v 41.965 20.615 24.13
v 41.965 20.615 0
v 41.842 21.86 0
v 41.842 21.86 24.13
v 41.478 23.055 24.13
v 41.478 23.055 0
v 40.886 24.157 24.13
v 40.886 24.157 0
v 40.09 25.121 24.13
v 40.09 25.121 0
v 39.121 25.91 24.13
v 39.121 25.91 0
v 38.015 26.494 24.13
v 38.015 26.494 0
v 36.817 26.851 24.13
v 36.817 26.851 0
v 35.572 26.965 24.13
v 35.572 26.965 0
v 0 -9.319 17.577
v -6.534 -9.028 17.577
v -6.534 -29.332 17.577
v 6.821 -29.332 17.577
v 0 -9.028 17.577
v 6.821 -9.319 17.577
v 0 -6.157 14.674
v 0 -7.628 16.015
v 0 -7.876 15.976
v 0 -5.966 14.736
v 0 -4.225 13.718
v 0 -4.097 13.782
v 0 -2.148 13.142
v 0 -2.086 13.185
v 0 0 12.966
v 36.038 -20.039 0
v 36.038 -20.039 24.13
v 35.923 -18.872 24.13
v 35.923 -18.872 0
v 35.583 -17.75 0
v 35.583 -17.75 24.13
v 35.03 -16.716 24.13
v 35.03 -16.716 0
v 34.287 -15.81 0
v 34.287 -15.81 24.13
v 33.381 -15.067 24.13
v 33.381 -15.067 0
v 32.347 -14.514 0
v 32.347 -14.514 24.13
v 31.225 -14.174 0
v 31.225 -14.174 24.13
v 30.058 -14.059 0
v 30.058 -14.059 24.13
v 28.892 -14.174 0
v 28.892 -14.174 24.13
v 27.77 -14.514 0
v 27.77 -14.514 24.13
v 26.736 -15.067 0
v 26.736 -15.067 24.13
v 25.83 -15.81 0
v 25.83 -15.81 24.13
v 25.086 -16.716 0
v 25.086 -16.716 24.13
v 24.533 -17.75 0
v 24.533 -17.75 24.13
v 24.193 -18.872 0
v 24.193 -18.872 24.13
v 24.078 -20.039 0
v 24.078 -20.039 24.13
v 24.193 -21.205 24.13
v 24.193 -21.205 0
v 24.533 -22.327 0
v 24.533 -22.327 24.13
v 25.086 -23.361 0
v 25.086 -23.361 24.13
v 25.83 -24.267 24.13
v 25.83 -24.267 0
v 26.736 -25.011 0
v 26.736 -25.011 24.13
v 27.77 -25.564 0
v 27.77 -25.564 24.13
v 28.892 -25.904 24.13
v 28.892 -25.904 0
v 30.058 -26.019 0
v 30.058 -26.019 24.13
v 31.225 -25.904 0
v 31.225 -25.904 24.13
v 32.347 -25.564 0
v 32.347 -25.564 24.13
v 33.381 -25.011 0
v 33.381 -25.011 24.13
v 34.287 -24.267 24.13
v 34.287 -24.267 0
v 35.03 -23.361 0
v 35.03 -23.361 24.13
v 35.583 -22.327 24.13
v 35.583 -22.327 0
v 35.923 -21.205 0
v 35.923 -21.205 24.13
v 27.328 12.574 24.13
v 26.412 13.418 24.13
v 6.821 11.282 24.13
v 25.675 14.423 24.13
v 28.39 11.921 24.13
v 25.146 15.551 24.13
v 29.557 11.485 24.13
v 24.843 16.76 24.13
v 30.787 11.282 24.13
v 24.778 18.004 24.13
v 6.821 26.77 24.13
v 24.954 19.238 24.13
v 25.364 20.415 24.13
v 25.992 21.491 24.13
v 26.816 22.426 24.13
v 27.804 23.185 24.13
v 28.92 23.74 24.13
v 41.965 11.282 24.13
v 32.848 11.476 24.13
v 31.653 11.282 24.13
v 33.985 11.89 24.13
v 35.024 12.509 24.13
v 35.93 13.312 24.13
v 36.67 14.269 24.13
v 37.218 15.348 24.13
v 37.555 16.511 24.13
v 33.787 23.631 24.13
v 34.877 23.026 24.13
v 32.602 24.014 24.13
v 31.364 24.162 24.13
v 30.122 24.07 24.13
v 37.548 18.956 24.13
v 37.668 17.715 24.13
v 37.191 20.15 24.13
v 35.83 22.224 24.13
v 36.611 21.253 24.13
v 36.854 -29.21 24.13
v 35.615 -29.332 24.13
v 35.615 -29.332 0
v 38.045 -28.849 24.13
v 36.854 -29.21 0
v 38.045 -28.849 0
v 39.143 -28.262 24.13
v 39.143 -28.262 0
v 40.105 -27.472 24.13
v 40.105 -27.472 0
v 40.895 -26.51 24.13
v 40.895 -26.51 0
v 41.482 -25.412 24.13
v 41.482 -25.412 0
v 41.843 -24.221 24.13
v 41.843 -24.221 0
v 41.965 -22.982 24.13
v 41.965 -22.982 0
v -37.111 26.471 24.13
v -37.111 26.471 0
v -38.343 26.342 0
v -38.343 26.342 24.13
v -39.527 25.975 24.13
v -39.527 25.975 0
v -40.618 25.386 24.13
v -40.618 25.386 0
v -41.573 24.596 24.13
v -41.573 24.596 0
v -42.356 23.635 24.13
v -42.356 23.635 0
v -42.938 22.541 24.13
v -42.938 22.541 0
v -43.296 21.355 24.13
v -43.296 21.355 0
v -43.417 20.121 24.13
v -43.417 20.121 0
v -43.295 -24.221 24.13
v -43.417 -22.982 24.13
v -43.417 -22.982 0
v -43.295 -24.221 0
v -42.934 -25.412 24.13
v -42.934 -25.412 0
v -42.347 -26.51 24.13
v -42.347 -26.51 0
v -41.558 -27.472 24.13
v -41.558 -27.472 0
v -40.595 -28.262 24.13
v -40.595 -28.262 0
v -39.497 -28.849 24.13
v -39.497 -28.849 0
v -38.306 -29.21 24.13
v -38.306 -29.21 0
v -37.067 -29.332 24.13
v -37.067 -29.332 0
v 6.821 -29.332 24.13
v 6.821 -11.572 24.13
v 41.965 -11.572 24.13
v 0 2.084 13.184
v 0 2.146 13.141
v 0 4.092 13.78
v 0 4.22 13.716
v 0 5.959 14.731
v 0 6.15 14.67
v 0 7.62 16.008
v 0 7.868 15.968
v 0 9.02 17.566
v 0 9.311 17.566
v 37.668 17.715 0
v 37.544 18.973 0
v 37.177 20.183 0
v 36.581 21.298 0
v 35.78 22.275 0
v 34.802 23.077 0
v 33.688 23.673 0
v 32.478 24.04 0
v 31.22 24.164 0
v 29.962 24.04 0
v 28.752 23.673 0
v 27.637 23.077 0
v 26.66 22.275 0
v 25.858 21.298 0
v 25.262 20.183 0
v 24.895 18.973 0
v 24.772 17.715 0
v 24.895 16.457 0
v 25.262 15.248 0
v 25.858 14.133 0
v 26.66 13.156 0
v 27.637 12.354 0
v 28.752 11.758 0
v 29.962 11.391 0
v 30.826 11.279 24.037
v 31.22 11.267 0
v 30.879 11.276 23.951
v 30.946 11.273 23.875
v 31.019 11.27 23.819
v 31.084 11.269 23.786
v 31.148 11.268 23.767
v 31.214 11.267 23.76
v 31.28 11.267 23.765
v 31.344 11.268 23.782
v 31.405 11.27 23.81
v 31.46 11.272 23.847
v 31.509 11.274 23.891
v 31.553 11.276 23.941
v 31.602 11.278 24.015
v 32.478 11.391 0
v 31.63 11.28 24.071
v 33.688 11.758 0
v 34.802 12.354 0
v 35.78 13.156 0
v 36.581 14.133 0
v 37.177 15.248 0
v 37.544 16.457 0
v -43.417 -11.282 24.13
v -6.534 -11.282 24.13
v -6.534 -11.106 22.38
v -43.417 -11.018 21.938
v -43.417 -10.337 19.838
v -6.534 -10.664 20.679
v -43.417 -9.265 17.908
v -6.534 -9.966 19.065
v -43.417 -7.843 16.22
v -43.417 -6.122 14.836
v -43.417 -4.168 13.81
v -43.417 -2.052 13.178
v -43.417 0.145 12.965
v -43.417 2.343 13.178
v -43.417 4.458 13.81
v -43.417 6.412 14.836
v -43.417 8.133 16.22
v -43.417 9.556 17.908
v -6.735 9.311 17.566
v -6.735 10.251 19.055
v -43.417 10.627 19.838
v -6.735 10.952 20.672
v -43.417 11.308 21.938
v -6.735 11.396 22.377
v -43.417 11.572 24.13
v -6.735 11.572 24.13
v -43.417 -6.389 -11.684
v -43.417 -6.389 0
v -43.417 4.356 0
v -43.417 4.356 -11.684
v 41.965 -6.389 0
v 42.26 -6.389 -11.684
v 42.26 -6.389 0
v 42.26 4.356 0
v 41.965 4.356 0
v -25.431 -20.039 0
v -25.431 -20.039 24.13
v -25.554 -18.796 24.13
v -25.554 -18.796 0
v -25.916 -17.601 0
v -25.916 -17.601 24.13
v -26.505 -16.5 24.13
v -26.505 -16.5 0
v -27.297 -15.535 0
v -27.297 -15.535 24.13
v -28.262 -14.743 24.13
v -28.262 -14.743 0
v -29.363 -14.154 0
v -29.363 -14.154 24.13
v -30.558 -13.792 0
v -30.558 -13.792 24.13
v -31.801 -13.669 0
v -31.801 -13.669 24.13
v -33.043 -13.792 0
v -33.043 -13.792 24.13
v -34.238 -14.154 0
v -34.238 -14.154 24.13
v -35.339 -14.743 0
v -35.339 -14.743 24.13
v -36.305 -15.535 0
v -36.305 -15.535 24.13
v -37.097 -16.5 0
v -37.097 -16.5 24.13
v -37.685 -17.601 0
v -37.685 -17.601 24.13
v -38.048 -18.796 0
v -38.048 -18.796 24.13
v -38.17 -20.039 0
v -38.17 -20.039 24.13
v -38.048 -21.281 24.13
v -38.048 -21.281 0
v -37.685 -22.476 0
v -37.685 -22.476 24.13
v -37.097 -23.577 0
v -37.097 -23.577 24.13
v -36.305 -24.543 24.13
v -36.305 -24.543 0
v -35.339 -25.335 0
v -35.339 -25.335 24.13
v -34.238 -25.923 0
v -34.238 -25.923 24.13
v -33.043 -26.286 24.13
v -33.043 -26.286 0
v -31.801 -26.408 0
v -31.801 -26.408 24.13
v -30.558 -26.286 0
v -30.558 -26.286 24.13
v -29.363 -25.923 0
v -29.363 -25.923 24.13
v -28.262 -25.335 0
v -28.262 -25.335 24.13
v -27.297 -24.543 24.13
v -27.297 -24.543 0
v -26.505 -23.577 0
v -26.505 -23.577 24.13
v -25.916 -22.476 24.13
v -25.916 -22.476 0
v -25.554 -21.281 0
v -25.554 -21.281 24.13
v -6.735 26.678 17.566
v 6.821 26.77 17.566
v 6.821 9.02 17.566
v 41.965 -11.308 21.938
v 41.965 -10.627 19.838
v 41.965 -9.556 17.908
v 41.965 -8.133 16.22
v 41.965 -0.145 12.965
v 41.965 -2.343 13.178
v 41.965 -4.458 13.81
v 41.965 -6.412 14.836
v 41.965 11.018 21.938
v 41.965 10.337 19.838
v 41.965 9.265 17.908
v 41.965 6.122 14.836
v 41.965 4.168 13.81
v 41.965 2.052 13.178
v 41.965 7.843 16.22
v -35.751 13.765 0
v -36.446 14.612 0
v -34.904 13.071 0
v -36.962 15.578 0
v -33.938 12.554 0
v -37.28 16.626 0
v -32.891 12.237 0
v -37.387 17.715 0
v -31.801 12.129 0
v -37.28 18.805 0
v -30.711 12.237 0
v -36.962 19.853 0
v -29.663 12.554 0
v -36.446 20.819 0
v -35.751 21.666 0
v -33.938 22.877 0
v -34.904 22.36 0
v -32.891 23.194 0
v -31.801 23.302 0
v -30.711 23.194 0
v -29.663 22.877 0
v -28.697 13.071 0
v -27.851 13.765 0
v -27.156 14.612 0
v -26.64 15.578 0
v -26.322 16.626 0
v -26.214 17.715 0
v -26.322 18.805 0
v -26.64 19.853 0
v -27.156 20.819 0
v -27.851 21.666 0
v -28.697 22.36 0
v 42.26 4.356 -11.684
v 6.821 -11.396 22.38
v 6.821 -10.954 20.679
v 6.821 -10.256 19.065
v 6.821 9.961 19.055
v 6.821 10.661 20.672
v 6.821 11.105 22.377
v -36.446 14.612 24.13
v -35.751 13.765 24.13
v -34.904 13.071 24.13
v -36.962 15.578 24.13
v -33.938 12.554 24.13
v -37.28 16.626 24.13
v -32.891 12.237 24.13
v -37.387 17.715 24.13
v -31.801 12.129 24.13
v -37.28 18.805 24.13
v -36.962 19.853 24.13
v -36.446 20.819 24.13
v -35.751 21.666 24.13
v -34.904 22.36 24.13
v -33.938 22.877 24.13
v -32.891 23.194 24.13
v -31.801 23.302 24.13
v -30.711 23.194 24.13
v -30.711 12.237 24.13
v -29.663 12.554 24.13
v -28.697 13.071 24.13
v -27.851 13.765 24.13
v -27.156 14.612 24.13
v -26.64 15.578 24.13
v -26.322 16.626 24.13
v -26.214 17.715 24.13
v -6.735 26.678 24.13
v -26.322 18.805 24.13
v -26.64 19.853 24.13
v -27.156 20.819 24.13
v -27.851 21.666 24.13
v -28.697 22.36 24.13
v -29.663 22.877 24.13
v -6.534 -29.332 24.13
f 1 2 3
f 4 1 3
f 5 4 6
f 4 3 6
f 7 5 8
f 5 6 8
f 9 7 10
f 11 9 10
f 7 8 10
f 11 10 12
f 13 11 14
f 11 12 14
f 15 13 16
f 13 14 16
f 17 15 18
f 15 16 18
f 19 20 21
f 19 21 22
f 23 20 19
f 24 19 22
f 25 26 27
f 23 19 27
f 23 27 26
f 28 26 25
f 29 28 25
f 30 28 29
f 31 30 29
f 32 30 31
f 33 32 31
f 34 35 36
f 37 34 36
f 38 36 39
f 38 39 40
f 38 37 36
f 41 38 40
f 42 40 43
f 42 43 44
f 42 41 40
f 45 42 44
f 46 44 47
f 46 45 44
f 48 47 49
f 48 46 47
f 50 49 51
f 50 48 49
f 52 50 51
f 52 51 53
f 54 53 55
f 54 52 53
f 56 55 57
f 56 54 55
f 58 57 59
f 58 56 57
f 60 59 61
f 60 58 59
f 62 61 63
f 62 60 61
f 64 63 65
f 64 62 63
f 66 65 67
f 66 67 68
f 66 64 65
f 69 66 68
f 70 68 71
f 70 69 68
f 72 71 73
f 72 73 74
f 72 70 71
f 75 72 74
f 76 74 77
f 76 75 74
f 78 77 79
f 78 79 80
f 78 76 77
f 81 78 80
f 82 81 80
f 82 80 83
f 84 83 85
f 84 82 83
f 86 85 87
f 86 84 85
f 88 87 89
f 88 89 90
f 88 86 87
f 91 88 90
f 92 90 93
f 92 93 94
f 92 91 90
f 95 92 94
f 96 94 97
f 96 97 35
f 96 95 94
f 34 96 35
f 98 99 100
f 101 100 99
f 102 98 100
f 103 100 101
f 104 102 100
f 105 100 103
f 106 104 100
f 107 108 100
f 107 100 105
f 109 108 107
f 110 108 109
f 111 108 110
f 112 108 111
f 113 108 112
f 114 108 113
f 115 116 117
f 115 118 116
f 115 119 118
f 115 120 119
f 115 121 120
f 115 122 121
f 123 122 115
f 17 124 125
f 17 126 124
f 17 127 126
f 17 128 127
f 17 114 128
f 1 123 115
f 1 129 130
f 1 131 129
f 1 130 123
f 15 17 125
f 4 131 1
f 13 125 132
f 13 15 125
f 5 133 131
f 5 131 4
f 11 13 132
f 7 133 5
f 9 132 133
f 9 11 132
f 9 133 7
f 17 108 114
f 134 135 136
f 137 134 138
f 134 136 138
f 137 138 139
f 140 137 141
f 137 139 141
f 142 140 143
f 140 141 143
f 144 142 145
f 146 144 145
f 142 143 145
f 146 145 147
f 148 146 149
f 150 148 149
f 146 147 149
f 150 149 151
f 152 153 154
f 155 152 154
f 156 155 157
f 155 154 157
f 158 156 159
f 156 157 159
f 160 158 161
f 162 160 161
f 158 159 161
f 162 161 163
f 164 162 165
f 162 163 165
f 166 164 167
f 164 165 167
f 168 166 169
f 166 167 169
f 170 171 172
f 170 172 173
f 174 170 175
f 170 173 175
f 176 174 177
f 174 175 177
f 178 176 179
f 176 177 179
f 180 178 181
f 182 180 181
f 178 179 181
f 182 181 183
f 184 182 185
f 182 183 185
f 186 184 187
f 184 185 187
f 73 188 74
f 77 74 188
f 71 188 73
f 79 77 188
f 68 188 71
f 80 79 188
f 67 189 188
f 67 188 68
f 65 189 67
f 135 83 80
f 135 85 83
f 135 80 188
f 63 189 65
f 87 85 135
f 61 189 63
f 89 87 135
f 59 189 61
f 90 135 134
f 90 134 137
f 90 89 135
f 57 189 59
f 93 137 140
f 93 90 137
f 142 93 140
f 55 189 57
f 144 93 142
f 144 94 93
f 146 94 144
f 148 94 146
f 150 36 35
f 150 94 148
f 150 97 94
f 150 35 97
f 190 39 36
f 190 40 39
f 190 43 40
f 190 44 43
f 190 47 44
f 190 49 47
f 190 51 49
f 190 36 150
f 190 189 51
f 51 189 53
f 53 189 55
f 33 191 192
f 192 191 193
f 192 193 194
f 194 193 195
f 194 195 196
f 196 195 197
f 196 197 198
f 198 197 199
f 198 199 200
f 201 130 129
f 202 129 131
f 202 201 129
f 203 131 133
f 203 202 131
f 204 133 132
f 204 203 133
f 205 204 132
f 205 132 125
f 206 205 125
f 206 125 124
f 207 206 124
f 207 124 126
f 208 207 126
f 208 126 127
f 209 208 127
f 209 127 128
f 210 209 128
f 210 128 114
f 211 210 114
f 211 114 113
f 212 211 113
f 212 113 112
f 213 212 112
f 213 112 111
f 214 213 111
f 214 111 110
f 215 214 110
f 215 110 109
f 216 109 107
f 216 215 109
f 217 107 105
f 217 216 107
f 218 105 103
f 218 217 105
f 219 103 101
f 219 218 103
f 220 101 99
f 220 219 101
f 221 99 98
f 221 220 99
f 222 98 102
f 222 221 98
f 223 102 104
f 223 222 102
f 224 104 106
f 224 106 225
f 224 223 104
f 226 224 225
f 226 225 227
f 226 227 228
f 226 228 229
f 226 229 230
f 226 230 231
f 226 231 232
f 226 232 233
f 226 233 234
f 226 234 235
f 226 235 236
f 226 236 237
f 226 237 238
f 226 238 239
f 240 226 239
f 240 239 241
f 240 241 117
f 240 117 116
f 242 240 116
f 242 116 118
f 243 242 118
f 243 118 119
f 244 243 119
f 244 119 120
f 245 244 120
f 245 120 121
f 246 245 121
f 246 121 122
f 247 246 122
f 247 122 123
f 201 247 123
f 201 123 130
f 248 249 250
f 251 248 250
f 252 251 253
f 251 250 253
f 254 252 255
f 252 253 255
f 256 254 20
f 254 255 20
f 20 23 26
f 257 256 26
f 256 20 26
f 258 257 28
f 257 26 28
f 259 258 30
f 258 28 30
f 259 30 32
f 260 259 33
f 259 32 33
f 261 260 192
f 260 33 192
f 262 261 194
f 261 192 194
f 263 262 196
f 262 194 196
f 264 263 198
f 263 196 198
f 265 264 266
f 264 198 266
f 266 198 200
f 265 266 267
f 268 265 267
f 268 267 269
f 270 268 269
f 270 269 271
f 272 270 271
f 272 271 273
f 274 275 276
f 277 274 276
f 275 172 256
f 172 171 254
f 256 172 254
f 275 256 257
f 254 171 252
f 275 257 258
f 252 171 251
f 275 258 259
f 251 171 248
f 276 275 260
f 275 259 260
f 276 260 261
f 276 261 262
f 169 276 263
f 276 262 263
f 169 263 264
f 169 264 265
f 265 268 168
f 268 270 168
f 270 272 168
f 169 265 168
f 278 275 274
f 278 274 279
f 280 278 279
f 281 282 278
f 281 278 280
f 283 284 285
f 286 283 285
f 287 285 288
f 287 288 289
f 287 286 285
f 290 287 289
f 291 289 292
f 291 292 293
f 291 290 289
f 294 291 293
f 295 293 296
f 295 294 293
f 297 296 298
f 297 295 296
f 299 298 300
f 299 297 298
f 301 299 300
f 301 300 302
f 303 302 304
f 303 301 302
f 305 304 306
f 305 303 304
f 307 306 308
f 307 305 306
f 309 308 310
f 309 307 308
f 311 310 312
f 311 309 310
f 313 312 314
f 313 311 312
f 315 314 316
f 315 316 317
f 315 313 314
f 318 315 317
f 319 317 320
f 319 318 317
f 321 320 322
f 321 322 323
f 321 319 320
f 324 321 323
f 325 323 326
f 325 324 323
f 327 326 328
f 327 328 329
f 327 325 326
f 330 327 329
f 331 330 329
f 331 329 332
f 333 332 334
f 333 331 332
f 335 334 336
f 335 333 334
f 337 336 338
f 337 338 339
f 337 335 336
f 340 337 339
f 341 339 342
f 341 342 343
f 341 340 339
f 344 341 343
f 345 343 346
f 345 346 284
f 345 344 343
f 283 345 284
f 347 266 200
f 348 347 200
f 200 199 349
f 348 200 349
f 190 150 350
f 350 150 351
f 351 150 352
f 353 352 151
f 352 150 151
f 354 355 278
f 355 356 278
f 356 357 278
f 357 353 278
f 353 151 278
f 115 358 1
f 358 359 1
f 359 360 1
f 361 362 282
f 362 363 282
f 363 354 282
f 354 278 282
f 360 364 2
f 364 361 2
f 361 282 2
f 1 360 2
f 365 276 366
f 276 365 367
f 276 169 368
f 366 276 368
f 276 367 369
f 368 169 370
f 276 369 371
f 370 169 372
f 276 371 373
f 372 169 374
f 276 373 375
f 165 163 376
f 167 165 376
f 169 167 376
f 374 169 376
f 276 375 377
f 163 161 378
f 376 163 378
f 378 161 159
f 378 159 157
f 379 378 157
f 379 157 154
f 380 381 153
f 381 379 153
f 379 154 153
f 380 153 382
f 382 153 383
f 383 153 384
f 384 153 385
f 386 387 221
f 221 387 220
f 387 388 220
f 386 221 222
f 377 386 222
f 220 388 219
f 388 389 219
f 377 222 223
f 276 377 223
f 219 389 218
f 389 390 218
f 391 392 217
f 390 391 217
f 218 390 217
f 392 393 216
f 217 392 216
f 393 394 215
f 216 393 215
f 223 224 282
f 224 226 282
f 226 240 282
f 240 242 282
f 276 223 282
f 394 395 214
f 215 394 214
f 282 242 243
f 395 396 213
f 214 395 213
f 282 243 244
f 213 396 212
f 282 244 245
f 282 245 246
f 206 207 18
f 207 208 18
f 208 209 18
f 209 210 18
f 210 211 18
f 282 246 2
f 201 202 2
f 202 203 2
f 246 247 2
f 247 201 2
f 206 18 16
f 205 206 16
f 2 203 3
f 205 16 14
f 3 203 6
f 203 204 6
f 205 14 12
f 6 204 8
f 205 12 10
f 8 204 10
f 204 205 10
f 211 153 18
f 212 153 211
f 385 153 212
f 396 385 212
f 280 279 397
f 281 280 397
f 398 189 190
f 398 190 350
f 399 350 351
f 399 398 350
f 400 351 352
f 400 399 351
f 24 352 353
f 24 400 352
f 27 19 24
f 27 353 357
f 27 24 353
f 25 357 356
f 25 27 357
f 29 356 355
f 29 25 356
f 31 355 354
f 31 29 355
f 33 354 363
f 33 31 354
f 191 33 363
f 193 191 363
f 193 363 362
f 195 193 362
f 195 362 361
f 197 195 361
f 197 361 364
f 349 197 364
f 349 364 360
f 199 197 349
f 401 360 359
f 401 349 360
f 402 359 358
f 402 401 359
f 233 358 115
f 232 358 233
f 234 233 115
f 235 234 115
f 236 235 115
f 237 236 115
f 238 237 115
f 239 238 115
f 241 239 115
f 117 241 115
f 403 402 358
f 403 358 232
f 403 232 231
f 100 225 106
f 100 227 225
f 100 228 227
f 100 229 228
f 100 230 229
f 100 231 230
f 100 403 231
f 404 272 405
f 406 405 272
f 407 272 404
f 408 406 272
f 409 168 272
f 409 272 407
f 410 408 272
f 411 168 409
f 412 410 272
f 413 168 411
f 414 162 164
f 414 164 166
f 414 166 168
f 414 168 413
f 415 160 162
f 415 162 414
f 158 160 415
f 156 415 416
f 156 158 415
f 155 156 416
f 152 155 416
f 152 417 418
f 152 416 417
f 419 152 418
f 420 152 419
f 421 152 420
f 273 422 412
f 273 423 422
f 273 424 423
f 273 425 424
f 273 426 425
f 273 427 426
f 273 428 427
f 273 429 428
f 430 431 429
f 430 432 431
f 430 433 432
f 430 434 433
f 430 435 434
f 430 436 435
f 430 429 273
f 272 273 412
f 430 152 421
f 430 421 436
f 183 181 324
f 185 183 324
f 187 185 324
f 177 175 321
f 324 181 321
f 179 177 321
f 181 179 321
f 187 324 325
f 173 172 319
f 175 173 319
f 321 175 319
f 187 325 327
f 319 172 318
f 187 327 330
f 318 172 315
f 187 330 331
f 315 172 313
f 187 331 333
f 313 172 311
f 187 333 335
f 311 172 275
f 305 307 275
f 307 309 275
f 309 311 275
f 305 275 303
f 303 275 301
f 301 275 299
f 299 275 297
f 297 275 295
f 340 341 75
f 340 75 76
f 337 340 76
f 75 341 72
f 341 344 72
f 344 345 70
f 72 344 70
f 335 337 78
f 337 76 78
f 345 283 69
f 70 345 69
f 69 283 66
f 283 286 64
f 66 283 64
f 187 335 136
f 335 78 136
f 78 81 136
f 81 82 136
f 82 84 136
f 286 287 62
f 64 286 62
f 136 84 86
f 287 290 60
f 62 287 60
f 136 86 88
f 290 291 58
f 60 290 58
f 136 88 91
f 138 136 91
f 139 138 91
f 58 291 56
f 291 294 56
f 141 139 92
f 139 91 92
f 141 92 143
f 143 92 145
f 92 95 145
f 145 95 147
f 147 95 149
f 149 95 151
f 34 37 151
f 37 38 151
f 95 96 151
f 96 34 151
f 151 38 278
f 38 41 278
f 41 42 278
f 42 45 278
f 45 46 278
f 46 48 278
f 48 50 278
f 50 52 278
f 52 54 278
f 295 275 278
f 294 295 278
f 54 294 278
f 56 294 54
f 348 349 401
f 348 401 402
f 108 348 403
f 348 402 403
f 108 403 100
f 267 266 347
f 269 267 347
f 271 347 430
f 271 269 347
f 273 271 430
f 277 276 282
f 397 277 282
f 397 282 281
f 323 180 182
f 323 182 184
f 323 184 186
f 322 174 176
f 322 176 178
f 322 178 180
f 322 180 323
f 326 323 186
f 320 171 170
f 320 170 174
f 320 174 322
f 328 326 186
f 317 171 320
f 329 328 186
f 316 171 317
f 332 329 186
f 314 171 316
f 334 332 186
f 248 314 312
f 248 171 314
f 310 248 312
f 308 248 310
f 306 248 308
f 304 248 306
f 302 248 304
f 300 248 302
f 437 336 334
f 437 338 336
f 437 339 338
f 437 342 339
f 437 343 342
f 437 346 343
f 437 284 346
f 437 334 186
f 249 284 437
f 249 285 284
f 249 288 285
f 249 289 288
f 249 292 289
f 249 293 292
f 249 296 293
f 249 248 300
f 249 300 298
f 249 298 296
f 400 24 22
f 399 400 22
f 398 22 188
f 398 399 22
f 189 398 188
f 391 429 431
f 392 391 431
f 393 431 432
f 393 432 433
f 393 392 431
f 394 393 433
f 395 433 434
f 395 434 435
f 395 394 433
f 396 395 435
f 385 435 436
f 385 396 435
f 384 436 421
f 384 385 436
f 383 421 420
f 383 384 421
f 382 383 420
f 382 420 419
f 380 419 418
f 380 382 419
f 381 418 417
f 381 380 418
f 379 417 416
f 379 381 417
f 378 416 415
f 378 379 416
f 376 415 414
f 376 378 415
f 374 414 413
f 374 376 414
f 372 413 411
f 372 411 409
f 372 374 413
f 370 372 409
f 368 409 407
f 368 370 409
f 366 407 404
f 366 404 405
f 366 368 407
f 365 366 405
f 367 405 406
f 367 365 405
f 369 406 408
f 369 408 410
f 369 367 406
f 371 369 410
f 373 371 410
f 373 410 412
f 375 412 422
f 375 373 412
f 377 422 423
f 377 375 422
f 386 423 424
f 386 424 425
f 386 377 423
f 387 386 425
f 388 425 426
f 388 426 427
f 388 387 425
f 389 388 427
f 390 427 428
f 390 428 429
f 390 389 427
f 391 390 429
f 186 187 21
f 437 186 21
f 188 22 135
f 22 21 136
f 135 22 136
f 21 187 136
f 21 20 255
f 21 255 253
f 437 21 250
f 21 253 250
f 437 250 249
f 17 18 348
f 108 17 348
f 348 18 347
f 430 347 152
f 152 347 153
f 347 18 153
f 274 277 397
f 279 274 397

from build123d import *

# Parameters (mm, degrees)
F0_R      = 6.369353
F0_R_2    = 5.980064
F0_R_3    = 5.586292
F0_R_4    = 6.448317
F1_DEPTH  = 24.13
F2_W      = 13.556814
F2_H      = 8.429615
F3_DEPTH  = 37.846
F4_W      = 13.355822
F4_H      = 12.236101
F5_DEPTH  = 46.736
F6_R      = 11.43
F7_DEPTH  = 53.594
F8_R      = 11.43
F9_DEPTH  = 57.404
F10_W     = 85.677572
F10_H     = 10.745444
F11_DEPTH = 11.684


with BuildPart() as f1:
    # F0 (on Top) → F1 (new body)
    with BuildSketch(Plane.XY):
        with BuildLine():
            ThreePointArc((-37.110602, 26.470889), (-41.57278, 24.595866), (-43.417405, 20.121036))
            Line((-43.417405, 20.121036), (-43.417405, -22.982161))
            ThreePointArc((-43.417405, -22.982161), (-41.557533, -27.472289), (-37.067405, -29.332161))
            Line((-37.067405, -29.332161), (35.615317, -29.332161))
            ThreePointArc((35.615317, -29.332161), (40.105445, -27.472289), (41.965317, -22.982161))
            Line((41.965317, -22.982161), (41.965317, 20.615476))
            ThreePointArc((41.965317, 20.615476), (40.090147, 25.120851), (35.572121, 26.965329))
            Line((35.572121, 26.965329), (-37.110602, 26.470889))
        make_face()
        with Locations((-31.80071, -20.038802)):
            Circle(F0_R, mode=Mode.SUBTRACT)
        with Locations((30.058201, -20.038802)):
            Circle(F0_R_2, mode=Mode.SUBTRACT)
        with Locations((-31.80071, 17.715463)):
            Circle(F0_R_3, mode=Mode.SUBTRACT)
        with Locations((31.21987, 17.715463)):
            Circle(F0_R_4, mode=Mode.SUBTRACT)
    extrude(amount=F1_DEPTH)

    # F2 (on Front) → F3 (cut)
    with BuildSketch(Plane.XZ):
        with Locations((0.043029, 21.780576)):
            Rectangle(F2_W, F2_H)
    extrude(amount=-F3_DEPTH, mode=Mode.SUBTRACT)

    # F4 (on Front) → F5 (cut)
    with BuildSketch(Plane.XZ):
        with Locations((0.143518, 23.694851)):
            Rectangle(F4_W, F4_H)
    extrude(amount=F5_DEPTH, mode=Mode.SUBTRACT)

    # F6 (on Right) → F7 (cut)
    with BuildSketch(Plane.YZ):
        with Locations((0.145212, 24.395064)):
            Circle(F6_R)
    extrude(amount=-F7_DEPTH, mode=Mode.SUBTRACT)

    # F8 (on Right) → F9 (cut)
    with BuildSketch(Plane.YZ):
        with Locations((-0.145212, 24.395064)):
            Circle(F8_R)
    extrude(amount=F9_DEPTH, mode=Mode.SUBTRACT)

    # F10 (on Top) → F11 (join)
    with BuildSketch(Plane.XY):
        with Locations((-0.578619, -1.016461)):
            Rectangle(F10_W, F10_H)
    extrude(amount=-F11_DEPTH)


solid = f1.part
